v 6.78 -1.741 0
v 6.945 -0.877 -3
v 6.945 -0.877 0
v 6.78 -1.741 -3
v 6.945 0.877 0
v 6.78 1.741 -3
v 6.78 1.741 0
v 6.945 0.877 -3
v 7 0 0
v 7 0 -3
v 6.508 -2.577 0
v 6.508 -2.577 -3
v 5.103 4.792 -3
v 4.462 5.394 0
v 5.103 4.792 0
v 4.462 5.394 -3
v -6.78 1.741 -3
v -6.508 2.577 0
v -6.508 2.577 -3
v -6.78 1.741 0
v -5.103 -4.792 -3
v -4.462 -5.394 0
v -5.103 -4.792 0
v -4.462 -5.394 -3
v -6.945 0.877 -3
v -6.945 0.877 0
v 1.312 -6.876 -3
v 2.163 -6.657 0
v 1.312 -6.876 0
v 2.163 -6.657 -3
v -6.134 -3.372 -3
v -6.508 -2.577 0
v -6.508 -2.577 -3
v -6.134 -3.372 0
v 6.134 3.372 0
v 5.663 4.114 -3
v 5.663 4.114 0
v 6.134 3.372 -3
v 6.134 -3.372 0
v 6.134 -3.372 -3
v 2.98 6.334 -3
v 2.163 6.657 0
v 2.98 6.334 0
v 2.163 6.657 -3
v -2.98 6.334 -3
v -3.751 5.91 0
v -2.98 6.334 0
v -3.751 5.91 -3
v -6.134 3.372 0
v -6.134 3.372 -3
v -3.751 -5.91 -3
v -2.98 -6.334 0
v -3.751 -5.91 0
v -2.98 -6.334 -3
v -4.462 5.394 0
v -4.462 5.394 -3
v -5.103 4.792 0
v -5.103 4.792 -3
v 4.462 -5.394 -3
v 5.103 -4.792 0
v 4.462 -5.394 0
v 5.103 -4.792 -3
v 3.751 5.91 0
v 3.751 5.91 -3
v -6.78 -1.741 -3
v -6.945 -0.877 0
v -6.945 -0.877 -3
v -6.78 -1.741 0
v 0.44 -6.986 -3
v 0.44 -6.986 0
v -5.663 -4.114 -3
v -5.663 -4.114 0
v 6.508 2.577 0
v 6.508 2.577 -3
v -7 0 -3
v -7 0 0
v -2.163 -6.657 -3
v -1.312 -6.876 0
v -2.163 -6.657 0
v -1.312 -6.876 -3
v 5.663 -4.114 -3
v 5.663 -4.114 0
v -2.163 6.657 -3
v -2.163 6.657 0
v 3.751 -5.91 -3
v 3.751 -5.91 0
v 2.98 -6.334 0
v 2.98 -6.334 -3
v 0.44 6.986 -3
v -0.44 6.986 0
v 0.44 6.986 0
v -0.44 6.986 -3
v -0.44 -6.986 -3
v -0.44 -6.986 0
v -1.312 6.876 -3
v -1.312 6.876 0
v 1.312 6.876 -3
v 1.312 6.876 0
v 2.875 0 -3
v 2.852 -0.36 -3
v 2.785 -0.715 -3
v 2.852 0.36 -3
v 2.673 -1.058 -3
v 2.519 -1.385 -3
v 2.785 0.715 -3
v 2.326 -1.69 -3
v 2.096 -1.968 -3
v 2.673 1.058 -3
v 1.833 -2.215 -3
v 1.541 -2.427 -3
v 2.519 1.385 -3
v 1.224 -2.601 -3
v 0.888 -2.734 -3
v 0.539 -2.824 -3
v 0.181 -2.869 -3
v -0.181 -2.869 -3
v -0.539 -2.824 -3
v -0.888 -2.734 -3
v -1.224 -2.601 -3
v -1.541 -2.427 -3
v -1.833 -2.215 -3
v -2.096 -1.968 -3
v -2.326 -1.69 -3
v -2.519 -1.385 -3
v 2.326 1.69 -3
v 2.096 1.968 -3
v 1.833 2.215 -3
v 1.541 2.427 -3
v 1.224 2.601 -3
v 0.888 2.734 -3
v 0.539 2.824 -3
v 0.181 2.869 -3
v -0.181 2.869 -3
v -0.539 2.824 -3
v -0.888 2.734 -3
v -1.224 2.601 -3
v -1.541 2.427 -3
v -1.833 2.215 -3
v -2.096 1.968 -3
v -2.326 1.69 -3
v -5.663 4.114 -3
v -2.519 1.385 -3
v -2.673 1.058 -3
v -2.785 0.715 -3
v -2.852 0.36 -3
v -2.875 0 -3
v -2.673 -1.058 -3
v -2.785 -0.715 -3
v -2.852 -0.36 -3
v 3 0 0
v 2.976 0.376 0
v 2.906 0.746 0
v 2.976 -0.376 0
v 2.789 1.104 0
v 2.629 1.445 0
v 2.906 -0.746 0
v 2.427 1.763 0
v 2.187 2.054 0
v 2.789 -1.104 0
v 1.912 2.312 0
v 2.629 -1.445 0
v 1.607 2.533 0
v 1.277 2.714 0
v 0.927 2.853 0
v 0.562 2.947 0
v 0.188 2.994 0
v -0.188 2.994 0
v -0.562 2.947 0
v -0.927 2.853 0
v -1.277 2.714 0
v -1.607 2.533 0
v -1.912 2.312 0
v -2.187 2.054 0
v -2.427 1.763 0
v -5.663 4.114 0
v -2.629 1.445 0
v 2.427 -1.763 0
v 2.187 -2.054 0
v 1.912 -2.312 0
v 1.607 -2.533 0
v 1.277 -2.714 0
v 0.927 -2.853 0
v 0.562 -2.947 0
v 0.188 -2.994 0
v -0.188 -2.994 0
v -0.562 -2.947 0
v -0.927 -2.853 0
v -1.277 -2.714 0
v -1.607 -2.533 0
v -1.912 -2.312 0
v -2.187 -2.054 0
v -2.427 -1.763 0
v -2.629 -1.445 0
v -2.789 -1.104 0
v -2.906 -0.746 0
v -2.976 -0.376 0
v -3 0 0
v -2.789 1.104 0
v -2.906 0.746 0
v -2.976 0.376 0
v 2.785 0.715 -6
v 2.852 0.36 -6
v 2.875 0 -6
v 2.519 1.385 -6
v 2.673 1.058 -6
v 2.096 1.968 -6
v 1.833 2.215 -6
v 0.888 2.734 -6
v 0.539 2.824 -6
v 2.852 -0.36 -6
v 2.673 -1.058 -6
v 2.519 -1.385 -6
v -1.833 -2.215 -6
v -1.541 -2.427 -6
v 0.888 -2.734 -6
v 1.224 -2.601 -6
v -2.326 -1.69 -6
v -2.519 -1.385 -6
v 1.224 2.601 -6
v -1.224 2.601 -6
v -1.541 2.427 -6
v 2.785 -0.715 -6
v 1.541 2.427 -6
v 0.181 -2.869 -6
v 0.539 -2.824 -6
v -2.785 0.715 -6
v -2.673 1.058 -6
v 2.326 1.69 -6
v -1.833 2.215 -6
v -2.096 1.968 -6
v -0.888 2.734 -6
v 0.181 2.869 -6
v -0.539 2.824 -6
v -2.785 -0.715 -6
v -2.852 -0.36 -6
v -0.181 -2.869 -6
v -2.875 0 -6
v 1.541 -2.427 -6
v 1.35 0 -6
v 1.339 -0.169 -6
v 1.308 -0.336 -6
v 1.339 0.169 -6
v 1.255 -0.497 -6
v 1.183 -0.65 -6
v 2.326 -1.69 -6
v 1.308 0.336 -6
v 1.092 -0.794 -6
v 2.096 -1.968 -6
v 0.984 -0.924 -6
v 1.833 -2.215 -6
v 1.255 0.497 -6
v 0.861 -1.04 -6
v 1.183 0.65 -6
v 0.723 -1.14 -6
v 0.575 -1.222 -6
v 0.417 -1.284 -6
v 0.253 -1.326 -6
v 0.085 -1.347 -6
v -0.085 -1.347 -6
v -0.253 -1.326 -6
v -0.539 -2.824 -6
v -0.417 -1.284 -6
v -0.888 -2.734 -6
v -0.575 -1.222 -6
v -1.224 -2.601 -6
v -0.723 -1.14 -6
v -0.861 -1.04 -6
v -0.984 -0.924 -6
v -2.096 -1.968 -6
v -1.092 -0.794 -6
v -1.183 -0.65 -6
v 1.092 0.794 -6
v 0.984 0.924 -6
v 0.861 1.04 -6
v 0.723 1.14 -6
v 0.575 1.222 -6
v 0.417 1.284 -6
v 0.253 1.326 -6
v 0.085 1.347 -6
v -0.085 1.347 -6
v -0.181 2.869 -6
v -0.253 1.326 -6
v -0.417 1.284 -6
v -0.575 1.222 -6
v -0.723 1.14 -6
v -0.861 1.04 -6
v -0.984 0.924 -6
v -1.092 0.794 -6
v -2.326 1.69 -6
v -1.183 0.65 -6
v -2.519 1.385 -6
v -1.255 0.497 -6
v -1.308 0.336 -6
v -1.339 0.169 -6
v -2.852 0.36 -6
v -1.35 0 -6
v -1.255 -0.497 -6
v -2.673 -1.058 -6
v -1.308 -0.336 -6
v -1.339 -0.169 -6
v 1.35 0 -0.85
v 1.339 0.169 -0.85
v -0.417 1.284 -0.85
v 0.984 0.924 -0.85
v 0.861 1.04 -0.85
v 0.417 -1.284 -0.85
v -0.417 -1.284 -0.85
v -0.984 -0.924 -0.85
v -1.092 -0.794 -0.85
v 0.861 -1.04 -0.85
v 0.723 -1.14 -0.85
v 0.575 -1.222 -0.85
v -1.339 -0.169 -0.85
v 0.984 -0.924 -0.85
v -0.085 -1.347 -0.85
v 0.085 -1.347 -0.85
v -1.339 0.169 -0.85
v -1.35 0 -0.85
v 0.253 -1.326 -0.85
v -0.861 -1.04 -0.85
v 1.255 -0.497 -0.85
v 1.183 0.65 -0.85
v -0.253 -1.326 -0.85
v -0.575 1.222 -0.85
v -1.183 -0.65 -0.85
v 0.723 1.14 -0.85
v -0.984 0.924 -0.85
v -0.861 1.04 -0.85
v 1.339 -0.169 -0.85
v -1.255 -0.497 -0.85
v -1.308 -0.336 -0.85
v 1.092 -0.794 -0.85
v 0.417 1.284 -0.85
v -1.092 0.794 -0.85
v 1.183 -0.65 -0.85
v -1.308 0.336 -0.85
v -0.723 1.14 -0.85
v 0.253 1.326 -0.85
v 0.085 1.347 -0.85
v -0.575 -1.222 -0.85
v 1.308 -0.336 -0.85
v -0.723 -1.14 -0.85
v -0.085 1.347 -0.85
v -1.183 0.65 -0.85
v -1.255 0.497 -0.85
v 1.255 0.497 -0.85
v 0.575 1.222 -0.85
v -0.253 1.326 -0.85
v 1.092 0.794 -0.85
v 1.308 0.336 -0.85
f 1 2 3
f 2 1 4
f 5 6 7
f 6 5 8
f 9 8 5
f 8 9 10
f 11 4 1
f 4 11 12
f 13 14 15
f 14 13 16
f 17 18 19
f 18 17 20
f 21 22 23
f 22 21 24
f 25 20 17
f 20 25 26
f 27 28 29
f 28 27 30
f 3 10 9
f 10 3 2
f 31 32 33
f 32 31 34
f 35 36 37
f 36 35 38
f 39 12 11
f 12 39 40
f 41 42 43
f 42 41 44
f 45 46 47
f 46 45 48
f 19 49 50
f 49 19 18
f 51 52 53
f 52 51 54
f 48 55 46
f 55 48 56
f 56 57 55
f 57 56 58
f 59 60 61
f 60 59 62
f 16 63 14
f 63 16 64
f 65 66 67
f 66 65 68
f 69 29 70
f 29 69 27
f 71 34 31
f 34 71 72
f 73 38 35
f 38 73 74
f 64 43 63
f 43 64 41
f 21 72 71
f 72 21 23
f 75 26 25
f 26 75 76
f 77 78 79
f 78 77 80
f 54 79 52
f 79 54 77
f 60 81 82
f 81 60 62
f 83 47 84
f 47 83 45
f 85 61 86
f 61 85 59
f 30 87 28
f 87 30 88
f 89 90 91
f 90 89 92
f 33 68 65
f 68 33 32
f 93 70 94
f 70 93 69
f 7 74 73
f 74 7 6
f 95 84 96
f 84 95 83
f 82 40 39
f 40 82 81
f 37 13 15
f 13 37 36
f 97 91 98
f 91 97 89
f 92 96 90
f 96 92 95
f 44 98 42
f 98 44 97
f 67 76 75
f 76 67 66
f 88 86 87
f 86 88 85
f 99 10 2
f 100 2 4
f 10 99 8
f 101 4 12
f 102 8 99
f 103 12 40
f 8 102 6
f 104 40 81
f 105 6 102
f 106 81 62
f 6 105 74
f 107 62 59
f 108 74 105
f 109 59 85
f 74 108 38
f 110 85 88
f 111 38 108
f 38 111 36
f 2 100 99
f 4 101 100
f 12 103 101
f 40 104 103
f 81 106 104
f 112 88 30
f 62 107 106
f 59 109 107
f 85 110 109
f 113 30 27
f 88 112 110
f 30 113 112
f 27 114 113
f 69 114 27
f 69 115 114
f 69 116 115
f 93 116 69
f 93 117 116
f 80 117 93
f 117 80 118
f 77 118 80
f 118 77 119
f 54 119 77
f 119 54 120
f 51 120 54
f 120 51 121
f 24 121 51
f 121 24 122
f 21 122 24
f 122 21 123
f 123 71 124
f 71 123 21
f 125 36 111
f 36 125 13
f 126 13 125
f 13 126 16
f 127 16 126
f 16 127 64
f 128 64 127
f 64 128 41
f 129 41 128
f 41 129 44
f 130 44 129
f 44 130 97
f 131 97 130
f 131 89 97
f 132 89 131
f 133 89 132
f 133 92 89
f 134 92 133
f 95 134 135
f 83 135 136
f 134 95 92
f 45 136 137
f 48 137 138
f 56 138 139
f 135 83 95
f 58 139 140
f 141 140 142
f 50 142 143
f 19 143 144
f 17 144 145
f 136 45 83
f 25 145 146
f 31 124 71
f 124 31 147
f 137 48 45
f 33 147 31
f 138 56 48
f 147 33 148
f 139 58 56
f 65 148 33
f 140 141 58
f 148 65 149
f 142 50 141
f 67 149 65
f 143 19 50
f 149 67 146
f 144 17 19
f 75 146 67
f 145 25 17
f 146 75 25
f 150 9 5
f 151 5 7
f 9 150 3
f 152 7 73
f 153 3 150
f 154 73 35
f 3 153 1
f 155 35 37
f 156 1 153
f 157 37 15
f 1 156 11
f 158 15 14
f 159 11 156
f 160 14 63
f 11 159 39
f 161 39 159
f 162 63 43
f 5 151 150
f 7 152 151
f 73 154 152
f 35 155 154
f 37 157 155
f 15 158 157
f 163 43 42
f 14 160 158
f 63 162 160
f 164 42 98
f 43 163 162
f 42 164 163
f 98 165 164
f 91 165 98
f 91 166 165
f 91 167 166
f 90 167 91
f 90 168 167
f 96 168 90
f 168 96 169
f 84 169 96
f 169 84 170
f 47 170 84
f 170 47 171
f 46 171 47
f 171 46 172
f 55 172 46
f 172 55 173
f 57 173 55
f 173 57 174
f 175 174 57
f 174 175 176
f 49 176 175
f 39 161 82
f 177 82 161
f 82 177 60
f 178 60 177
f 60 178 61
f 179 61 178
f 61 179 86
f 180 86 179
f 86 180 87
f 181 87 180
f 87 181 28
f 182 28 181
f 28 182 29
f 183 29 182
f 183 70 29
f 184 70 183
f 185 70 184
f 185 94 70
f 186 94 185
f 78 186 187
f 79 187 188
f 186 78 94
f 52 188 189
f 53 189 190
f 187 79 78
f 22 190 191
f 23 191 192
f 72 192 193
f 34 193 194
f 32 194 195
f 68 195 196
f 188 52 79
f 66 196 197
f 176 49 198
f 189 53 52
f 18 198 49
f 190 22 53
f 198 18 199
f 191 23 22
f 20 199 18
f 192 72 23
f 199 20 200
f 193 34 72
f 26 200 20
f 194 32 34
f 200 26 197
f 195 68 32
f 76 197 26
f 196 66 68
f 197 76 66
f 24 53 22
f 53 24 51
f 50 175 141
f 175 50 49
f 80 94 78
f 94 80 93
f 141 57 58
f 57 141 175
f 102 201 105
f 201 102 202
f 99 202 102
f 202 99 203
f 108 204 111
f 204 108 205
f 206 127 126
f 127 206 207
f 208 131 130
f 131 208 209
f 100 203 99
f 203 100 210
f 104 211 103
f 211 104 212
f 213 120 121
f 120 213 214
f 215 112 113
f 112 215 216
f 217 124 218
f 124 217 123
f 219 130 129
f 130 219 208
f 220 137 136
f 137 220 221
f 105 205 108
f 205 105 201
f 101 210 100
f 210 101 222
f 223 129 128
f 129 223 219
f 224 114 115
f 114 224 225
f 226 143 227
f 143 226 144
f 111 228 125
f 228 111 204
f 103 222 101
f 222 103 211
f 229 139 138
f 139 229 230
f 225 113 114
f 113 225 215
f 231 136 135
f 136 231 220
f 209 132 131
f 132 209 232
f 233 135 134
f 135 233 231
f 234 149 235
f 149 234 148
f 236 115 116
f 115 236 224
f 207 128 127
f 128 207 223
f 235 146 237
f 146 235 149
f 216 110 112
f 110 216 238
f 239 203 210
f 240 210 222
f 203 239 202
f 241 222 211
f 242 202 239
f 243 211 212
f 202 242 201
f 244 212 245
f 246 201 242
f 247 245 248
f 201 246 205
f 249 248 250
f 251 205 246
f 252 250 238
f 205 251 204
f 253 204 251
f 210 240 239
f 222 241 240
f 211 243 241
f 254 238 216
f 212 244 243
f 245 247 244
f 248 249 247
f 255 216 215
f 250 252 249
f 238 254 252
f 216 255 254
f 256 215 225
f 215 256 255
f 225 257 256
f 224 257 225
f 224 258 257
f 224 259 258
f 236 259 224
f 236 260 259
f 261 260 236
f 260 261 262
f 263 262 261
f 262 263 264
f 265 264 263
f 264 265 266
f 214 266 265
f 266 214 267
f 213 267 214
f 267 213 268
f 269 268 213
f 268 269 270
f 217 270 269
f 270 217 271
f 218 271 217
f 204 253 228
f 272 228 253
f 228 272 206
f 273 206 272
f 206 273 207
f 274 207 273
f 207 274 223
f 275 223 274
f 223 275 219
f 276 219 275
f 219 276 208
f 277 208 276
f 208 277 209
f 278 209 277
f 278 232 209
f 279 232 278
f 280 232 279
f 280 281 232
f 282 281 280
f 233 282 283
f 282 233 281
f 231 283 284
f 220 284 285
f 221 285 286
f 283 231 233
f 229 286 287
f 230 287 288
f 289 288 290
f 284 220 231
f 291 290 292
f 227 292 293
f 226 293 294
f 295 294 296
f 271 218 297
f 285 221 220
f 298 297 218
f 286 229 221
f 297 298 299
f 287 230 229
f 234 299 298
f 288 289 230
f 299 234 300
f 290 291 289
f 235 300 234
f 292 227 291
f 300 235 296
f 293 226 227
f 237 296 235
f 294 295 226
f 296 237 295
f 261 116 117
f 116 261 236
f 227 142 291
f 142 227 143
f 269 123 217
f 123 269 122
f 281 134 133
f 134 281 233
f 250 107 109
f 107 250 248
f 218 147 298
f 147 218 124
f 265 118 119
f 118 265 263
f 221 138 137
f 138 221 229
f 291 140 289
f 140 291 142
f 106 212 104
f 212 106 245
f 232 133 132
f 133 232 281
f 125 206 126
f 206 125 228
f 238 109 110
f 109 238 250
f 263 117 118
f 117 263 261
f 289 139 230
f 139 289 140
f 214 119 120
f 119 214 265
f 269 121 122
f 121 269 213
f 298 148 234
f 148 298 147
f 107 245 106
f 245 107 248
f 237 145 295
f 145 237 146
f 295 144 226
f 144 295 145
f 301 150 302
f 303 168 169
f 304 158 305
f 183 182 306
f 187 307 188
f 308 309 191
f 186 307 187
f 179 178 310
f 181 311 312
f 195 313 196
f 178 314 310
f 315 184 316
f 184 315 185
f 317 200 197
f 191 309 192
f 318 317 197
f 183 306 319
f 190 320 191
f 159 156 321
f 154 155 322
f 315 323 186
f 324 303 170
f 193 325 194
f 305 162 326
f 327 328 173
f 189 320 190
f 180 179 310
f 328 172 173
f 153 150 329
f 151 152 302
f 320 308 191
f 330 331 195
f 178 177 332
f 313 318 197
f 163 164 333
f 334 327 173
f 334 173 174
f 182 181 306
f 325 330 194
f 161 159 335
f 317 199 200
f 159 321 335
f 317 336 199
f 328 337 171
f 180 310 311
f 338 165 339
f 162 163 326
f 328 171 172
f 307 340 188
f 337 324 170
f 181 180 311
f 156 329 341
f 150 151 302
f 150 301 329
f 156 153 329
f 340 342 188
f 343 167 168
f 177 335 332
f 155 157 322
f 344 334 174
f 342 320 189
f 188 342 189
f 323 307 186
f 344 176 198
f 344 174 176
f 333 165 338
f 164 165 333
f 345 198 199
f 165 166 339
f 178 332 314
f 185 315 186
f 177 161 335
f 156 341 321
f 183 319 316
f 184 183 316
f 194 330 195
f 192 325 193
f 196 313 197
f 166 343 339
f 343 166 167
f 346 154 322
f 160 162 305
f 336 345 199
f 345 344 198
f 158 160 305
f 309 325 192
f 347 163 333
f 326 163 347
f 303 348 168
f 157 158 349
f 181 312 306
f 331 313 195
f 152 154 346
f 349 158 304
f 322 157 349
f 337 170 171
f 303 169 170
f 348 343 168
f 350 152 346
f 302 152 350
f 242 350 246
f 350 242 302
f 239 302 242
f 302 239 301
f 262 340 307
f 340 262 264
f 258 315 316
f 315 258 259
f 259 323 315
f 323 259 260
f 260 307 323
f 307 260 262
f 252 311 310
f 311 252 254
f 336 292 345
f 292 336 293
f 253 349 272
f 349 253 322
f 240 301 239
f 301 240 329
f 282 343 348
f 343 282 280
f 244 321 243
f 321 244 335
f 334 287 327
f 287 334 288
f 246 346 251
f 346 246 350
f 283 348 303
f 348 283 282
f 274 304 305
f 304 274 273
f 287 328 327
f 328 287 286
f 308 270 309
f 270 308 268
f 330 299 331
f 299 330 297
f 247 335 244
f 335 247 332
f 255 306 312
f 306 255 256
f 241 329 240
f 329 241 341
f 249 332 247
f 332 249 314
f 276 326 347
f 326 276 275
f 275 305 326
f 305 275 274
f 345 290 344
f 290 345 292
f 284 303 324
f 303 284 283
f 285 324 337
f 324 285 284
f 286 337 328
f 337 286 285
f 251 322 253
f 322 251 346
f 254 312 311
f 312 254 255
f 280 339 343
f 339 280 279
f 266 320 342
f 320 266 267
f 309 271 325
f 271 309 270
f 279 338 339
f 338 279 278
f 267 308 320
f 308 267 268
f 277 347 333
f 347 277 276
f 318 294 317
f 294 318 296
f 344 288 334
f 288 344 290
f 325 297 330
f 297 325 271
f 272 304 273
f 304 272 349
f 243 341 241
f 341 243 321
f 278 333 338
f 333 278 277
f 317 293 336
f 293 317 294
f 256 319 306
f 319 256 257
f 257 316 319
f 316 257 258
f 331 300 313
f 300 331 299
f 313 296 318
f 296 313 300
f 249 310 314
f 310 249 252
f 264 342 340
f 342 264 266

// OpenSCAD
$fn = 50;

difference() {
	union() {
		translate(v = [0, 0, -3.0]) {
			cylinder(h = 3, r = 7.0);
		}
		#translate(v = [0, 0, -6.0]) {
			cylinder(h = 6, r = 2.875);
		}
	}
	union() {
		translate(v = [0, 0, 0]) {
			rotate(a = [0, 0, 0]) {
				difference() {
					union() {
						translate(v = [0, 0, -6.0]) {
							cylinder(h = 6, r = 1.0);
						}
						translate(v = [0, 0, -0.85]) {
							cylinder(h = 0.85, r1 = 1.35, r2 = 3.0);
						}
						translate(v = [0, 0, -6.0]) {
							cylinder(h = 6, r = 1.35);
						}
						translate(v = [0, 0, -6.0]) {
							cylinder(h = 6, r = 1.0);
						}
					}
					union();
				}
			}
		}
	}
}
